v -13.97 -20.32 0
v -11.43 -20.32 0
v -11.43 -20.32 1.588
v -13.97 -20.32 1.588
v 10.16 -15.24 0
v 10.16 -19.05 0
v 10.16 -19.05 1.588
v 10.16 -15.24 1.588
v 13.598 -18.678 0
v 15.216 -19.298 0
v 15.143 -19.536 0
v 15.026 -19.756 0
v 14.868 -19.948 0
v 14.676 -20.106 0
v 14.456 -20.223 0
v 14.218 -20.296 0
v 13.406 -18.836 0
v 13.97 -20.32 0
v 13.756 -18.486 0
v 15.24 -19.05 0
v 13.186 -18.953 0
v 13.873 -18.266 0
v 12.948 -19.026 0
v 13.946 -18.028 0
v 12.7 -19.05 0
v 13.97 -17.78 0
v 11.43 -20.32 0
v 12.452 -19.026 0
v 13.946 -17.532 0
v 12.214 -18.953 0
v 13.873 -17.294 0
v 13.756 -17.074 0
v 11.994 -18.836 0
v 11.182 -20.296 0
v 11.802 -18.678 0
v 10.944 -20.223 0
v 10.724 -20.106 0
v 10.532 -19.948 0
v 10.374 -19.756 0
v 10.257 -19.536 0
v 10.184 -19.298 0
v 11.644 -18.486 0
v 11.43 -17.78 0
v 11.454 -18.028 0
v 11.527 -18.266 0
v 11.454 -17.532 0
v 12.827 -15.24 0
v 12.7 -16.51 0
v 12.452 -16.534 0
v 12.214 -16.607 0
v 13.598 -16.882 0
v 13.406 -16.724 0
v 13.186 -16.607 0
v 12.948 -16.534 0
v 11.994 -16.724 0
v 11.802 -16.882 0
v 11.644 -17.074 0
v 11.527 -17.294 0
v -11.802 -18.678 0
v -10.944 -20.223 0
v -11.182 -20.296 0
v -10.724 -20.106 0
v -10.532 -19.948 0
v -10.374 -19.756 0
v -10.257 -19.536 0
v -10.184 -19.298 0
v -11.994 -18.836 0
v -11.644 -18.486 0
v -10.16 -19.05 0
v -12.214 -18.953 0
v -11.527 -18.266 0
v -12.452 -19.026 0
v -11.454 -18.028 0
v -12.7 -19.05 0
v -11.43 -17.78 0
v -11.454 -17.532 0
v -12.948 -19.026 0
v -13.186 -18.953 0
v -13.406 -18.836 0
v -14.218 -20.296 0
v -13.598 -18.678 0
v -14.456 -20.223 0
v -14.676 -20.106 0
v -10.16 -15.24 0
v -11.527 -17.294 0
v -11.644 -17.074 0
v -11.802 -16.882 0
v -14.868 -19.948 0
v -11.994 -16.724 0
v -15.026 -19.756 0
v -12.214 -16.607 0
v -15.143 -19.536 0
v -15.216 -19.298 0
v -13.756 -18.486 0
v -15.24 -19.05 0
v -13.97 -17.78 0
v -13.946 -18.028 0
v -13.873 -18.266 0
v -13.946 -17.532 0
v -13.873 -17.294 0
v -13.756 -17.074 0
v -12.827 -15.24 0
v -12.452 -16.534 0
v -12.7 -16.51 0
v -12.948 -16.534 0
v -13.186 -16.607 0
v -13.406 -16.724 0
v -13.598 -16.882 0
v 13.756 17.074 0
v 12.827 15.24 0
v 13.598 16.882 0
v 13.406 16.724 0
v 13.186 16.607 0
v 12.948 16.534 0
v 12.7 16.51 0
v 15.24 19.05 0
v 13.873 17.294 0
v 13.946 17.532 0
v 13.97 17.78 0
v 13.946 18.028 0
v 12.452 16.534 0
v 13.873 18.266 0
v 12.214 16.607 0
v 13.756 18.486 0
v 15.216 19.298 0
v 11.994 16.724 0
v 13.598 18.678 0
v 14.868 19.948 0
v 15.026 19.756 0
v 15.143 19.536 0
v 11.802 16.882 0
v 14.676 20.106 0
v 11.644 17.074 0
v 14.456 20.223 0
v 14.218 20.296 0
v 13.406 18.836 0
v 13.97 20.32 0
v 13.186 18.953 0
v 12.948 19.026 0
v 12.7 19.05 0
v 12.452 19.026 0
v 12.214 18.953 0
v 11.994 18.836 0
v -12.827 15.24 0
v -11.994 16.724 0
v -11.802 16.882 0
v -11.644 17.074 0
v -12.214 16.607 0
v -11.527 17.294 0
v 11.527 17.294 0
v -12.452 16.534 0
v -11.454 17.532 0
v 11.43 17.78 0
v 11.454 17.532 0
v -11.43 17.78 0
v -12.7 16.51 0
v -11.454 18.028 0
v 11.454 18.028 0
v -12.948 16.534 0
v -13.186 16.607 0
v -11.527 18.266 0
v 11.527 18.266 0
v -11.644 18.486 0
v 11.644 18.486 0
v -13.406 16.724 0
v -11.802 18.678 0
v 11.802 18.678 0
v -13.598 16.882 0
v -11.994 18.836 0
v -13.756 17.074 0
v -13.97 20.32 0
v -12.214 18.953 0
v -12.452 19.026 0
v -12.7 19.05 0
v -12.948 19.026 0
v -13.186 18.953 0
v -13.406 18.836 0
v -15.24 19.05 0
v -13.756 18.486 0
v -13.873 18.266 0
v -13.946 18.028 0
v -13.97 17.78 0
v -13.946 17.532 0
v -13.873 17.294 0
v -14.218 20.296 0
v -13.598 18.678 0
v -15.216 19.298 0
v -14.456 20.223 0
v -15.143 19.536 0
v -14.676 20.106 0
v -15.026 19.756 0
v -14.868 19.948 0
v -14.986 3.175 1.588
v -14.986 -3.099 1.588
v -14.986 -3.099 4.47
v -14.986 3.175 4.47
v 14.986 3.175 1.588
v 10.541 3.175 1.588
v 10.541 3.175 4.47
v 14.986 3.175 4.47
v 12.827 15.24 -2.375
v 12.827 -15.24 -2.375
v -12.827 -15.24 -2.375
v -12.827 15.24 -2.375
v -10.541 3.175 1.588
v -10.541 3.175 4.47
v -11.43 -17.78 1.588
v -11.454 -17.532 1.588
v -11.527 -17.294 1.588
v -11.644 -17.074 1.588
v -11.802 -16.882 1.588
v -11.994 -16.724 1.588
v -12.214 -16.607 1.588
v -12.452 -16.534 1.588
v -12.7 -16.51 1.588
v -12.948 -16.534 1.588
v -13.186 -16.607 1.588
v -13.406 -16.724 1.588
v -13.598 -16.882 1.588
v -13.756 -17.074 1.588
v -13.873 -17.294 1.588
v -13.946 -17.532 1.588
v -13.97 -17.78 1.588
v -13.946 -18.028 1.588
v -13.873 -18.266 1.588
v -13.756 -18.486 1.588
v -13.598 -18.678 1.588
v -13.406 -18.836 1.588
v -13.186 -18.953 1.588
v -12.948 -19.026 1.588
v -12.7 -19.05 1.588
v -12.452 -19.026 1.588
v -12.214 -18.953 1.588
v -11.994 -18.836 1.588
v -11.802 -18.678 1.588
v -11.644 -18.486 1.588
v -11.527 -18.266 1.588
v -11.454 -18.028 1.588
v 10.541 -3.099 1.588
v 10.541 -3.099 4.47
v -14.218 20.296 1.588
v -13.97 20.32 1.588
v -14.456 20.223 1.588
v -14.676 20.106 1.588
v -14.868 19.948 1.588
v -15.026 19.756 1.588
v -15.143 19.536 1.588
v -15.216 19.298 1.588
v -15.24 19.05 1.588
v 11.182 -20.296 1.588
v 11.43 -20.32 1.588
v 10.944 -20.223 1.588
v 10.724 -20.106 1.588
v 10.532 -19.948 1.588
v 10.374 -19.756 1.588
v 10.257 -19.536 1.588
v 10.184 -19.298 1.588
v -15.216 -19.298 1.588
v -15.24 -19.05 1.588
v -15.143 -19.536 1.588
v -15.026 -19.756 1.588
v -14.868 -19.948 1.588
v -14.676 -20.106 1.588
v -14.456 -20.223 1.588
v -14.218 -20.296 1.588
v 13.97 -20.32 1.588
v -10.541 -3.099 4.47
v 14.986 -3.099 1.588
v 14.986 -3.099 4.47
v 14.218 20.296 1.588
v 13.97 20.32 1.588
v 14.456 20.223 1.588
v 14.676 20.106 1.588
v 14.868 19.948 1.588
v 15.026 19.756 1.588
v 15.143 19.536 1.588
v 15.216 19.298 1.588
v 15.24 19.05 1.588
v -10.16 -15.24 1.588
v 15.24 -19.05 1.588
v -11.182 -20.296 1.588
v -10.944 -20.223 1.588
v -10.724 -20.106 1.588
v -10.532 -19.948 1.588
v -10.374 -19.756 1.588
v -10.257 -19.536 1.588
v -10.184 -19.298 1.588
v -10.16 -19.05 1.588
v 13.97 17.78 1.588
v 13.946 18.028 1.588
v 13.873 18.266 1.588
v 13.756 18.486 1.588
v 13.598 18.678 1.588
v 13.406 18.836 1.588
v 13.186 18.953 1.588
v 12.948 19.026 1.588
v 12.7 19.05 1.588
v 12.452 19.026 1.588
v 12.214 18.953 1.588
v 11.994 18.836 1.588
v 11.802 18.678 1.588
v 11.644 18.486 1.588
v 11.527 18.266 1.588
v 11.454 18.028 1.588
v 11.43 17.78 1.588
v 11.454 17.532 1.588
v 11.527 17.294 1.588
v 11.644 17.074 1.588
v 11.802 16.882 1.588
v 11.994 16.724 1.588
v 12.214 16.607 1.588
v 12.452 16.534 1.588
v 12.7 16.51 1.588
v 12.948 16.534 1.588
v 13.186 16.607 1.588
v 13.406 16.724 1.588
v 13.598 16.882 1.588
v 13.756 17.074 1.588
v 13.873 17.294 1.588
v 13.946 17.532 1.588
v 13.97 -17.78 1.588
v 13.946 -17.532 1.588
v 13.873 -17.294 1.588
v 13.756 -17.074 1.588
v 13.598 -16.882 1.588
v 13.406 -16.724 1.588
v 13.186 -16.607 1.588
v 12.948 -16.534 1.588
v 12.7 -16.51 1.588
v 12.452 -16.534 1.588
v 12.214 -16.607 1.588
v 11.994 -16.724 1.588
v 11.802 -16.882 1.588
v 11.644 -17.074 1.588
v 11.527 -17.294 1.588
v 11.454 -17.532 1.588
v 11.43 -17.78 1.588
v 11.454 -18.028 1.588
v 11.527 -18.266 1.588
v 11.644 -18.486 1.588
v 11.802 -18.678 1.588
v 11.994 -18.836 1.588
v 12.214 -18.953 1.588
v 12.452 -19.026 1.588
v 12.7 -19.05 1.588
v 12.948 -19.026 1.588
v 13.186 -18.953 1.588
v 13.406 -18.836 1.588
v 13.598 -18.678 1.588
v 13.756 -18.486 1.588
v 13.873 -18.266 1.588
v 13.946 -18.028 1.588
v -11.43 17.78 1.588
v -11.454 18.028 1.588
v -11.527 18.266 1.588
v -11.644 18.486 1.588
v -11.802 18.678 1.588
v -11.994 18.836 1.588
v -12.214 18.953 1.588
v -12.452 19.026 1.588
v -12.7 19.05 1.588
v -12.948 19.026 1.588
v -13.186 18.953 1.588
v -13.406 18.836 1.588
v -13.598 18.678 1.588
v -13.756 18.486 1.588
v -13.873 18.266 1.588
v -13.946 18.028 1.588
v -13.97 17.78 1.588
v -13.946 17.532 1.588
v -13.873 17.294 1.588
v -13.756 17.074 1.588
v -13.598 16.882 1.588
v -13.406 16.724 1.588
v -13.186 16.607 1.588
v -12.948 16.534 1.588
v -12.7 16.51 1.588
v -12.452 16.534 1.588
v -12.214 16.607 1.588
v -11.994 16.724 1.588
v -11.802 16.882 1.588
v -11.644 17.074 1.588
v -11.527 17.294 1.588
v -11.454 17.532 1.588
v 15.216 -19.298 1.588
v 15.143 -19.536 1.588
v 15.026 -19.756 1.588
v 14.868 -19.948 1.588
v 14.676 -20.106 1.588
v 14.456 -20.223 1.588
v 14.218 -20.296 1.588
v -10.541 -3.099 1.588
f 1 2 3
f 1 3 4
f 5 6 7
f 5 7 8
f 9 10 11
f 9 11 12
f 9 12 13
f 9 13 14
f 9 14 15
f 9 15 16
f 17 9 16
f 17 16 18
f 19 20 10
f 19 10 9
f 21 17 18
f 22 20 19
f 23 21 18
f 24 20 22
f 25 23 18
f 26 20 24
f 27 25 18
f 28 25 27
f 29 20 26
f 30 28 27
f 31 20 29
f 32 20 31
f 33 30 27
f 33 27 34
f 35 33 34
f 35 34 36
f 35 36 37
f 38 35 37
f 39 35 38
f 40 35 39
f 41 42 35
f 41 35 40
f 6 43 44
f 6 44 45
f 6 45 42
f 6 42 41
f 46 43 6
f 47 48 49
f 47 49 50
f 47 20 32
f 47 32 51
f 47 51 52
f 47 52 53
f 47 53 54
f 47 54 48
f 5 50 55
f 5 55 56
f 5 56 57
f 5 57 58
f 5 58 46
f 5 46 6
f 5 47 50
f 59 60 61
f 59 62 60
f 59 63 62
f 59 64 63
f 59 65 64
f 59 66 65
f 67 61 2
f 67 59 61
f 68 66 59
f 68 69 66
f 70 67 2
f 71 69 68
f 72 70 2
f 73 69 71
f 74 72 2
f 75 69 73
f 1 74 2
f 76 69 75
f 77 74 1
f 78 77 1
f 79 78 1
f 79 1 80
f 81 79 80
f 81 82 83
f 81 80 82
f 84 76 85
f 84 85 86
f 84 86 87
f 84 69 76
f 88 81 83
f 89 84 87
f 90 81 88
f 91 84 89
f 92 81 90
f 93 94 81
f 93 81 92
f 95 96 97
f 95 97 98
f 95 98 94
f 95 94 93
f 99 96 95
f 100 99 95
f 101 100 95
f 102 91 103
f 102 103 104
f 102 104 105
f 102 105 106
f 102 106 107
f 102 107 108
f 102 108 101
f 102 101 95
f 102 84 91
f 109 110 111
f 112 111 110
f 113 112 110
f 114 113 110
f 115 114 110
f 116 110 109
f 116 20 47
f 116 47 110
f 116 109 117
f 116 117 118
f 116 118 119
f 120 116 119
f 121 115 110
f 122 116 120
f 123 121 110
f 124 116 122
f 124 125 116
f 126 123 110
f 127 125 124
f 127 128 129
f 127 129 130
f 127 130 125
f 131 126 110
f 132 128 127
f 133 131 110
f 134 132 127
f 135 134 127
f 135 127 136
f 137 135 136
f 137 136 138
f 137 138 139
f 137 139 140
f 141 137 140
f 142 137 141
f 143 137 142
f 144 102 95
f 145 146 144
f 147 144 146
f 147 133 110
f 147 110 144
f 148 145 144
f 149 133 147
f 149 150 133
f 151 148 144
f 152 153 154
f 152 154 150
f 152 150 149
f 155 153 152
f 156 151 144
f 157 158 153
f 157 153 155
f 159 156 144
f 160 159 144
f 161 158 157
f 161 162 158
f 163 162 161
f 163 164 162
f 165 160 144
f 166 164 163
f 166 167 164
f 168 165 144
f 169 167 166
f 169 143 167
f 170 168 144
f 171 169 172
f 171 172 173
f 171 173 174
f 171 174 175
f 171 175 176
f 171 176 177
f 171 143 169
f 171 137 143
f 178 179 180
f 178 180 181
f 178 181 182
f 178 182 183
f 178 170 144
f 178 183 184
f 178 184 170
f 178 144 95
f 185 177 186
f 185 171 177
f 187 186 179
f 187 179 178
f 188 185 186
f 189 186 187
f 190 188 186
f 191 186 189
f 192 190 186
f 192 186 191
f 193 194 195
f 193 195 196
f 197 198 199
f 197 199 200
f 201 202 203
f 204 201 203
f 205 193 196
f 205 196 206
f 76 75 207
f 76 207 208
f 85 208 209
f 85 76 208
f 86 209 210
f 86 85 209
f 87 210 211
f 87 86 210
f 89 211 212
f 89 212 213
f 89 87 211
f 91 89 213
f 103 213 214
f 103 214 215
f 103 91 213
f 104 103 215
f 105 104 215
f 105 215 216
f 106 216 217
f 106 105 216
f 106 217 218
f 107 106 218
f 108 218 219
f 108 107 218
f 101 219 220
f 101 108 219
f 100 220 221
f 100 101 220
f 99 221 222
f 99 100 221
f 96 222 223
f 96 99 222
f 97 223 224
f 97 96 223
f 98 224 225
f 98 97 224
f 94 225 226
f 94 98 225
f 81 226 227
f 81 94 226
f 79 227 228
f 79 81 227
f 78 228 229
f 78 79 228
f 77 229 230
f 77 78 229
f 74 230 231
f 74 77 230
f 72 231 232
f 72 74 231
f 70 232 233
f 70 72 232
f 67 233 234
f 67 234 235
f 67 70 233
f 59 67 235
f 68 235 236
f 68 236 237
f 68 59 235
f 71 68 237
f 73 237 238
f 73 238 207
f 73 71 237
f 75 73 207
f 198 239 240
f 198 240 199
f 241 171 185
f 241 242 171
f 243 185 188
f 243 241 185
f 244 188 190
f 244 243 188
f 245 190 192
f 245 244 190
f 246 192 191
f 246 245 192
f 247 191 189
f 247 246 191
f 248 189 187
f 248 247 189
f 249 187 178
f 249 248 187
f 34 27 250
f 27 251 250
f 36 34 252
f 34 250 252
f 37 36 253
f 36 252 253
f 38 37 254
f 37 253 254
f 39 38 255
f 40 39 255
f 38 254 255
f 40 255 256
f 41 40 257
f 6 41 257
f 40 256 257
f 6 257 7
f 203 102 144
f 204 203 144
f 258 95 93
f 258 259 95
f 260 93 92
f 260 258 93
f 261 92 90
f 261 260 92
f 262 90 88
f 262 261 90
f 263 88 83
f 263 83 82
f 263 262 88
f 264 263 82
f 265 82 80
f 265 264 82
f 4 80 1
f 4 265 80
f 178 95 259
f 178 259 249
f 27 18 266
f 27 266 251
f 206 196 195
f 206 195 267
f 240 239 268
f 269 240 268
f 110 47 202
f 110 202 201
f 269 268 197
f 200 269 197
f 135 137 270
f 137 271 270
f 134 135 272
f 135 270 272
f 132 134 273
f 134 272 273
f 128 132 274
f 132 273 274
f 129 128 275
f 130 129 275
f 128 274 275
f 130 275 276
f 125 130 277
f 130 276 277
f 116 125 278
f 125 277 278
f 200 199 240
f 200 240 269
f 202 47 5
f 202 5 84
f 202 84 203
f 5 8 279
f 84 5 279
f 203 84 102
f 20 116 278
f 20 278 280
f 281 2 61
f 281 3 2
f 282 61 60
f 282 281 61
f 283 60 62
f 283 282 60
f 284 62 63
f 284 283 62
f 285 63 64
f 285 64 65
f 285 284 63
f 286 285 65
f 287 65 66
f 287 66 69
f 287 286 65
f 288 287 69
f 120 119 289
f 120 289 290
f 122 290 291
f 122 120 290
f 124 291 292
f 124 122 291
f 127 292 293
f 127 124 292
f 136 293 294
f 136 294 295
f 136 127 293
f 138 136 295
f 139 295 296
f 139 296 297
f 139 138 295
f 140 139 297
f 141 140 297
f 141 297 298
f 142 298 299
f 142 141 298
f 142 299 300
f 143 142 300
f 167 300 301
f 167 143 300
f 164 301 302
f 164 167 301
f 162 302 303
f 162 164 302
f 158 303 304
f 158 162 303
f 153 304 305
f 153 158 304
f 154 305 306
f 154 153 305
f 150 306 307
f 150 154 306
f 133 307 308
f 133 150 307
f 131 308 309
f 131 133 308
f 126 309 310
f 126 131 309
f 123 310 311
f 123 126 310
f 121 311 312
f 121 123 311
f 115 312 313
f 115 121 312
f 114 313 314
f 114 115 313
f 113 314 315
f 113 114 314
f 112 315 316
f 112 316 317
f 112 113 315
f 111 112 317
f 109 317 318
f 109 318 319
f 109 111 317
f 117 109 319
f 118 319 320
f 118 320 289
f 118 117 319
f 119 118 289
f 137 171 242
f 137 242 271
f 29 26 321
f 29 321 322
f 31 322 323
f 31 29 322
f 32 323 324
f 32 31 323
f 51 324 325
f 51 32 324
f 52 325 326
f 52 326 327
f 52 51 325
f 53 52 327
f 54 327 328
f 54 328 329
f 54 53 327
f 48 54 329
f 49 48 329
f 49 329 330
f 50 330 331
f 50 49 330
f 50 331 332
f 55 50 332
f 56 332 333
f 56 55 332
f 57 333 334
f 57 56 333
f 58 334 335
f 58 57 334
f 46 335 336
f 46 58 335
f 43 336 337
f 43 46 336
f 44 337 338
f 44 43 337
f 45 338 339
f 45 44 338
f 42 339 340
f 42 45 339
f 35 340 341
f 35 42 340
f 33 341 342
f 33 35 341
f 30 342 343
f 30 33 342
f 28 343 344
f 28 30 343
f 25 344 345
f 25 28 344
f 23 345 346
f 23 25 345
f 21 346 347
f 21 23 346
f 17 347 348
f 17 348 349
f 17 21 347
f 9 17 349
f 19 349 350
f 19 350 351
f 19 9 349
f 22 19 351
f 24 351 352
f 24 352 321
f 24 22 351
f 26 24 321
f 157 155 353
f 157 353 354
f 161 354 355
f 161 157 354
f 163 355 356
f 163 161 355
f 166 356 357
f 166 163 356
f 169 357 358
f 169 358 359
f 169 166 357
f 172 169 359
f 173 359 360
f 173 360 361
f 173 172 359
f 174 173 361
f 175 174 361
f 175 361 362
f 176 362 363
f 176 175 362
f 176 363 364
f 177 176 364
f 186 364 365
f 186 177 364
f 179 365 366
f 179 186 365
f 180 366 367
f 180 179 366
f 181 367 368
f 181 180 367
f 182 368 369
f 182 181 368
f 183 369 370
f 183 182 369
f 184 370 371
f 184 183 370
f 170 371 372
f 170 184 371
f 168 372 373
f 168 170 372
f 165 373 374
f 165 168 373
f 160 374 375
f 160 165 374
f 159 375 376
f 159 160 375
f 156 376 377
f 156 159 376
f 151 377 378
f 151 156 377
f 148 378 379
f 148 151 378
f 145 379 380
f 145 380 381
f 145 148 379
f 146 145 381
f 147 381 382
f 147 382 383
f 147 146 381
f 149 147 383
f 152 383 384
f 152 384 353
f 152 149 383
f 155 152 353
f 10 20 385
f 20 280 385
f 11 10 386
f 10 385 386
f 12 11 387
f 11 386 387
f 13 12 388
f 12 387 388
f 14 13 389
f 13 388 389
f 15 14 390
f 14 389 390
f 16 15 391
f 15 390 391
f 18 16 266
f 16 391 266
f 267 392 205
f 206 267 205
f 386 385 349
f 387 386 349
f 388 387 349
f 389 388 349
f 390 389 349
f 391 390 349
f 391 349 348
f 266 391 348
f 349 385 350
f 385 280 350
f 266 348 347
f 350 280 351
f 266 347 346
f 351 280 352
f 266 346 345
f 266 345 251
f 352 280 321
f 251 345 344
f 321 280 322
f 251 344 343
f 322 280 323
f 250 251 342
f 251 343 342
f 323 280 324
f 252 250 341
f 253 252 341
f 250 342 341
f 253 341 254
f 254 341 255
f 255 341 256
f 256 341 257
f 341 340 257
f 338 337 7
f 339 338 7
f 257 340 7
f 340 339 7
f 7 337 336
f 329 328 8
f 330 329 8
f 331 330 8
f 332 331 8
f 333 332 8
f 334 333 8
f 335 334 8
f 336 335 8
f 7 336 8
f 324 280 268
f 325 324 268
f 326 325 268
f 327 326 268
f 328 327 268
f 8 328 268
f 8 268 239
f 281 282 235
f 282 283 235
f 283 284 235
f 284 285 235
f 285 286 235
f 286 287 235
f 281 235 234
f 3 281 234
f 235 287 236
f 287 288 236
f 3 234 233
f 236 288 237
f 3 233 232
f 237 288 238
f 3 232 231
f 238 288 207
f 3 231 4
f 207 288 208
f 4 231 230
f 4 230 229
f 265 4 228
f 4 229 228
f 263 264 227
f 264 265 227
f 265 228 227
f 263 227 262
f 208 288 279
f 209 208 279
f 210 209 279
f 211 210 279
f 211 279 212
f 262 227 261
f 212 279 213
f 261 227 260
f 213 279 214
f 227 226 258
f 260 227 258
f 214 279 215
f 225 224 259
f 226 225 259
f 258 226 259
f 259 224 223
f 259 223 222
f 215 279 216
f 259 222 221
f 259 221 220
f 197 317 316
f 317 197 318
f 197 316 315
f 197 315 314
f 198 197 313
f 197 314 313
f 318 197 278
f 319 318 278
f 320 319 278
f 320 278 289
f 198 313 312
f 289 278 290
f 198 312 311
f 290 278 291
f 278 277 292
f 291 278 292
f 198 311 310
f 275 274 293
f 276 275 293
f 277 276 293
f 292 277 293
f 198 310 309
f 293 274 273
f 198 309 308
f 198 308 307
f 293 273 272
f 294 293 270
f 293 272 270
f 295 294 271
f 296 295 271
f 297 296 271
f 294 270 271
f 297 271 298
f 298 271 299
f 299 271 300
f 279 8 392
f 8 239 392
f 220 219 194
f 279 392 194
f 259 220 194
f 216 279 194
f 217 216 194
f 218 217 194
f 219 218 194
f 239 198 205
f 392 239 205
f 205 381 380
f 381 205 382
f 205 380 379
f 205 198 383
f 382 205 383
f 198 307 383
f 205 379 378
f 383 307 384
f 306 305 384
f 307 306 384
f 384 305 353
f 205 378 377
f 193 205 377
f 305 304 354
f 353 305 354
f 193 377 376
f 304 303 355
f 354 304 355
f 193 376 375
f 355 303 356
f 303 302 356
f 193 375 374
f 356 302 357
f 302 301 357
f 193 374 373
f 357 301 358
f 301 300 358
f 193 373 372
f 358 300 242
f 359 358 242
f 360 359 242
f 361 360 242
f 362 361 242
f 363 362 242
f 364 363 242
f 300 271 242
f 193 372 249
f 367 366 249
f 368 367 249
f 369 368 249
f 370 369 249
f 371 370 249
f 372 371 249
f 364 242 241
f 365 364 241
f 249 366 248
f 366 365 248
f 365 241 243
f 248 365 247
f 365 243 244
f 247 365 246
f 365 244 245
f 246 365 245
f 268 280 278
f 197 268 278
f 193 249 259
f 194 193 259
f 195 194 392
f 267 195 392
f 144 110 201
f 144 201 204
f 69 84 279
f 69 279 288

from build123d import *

# Parameters (mm, degrees)
SKETCH1_R           = 1.27
BOSS_EXTRUDE1_DEPTH = 1.5875
FILLET1_R           = 1.27
SKETCH2_W           = 25.654
SKETCH2_H           = 30.48
BOSS_EXTRUDE2_DEPTH = 2.3749
SKETCH3_W           = 4.445
SKETCH3_H           = 6.2738
BOSS_EXTRUDE3_DEPTH = 2.8829


with BuildPart() as part:
    # Sketch1 → Boss-Extrude1 (new body)
    with BuildSketch(Plane.XY):
        Polygon((-15.24, 20.32), (15.24, 20.32), (15.24, -20.32), (10.16, -20.32), (10.16, -15.24), (-10.16, -15.24), (-10.16, -20.32), (-15.24, -20.32), align=None)
        with Locations((-12.7, -17.78)):
            Circle(SKETCH1_R, mode=Mode.SUBTRACT)
        with Locations((12.7, -17.78)):
            Circle(SKETCH1_R, mode=Mode.SUBTRACT)
        with Locations((-12.7, 17.78)):
            Circle(SKETCH1_R, mode=Mode.SUBTRACT)
        with Locations((12.7, 17.78)):
            Circle(SKETCH1_R, mode=Mode.SUBTRACT)
    extrude(amount=BOSS_EXTRUDE1_DEPTH)

    # Fillet1
    fillet1_edges = [part.edges().sort_by_distance(p)[0] for p in [
        (-15.24, 20.32, 0.79375),
        (15.24, 20.32, 0.79375),
        (15.24, -20.32, 0.79375),
        (10.16, -20.32, 0.79375),
        (-10.16, -20.32, 0.79375),
        (-15.24, -20.32, 0.79375),
    ]]
    fillet(fillet1_edges, radius=FILLET1_R)

    # Sketch2 → Boss-Extrude2 (add)
    with BuildSketch(Plane(origin=(0, 0, 0), x_dir=(-1, 0, 0), z_dir=(0, 0, -1))):
        Rectangle(SKETCH2_W, SKETCH2_H)
    extrude(amount=BOSS_EXTRUDE2_DEPTH)

    # Sketch3 → Boss-Extrude3 (add)
    with BuildSketch(Plane.XY.offset(1.5875)):
        with Locations((-12.7635, 0.0381)):
            Rectangle(SKETCH3_W, SKETCH3_H)
        with Locations((12.7635, 0.0381)):
            Rectangle(SKETCH3_W, SKETCH3_H)
    extrude(amount=BOSS_EXTRUDE3_DEPTH)


solid = part.part
